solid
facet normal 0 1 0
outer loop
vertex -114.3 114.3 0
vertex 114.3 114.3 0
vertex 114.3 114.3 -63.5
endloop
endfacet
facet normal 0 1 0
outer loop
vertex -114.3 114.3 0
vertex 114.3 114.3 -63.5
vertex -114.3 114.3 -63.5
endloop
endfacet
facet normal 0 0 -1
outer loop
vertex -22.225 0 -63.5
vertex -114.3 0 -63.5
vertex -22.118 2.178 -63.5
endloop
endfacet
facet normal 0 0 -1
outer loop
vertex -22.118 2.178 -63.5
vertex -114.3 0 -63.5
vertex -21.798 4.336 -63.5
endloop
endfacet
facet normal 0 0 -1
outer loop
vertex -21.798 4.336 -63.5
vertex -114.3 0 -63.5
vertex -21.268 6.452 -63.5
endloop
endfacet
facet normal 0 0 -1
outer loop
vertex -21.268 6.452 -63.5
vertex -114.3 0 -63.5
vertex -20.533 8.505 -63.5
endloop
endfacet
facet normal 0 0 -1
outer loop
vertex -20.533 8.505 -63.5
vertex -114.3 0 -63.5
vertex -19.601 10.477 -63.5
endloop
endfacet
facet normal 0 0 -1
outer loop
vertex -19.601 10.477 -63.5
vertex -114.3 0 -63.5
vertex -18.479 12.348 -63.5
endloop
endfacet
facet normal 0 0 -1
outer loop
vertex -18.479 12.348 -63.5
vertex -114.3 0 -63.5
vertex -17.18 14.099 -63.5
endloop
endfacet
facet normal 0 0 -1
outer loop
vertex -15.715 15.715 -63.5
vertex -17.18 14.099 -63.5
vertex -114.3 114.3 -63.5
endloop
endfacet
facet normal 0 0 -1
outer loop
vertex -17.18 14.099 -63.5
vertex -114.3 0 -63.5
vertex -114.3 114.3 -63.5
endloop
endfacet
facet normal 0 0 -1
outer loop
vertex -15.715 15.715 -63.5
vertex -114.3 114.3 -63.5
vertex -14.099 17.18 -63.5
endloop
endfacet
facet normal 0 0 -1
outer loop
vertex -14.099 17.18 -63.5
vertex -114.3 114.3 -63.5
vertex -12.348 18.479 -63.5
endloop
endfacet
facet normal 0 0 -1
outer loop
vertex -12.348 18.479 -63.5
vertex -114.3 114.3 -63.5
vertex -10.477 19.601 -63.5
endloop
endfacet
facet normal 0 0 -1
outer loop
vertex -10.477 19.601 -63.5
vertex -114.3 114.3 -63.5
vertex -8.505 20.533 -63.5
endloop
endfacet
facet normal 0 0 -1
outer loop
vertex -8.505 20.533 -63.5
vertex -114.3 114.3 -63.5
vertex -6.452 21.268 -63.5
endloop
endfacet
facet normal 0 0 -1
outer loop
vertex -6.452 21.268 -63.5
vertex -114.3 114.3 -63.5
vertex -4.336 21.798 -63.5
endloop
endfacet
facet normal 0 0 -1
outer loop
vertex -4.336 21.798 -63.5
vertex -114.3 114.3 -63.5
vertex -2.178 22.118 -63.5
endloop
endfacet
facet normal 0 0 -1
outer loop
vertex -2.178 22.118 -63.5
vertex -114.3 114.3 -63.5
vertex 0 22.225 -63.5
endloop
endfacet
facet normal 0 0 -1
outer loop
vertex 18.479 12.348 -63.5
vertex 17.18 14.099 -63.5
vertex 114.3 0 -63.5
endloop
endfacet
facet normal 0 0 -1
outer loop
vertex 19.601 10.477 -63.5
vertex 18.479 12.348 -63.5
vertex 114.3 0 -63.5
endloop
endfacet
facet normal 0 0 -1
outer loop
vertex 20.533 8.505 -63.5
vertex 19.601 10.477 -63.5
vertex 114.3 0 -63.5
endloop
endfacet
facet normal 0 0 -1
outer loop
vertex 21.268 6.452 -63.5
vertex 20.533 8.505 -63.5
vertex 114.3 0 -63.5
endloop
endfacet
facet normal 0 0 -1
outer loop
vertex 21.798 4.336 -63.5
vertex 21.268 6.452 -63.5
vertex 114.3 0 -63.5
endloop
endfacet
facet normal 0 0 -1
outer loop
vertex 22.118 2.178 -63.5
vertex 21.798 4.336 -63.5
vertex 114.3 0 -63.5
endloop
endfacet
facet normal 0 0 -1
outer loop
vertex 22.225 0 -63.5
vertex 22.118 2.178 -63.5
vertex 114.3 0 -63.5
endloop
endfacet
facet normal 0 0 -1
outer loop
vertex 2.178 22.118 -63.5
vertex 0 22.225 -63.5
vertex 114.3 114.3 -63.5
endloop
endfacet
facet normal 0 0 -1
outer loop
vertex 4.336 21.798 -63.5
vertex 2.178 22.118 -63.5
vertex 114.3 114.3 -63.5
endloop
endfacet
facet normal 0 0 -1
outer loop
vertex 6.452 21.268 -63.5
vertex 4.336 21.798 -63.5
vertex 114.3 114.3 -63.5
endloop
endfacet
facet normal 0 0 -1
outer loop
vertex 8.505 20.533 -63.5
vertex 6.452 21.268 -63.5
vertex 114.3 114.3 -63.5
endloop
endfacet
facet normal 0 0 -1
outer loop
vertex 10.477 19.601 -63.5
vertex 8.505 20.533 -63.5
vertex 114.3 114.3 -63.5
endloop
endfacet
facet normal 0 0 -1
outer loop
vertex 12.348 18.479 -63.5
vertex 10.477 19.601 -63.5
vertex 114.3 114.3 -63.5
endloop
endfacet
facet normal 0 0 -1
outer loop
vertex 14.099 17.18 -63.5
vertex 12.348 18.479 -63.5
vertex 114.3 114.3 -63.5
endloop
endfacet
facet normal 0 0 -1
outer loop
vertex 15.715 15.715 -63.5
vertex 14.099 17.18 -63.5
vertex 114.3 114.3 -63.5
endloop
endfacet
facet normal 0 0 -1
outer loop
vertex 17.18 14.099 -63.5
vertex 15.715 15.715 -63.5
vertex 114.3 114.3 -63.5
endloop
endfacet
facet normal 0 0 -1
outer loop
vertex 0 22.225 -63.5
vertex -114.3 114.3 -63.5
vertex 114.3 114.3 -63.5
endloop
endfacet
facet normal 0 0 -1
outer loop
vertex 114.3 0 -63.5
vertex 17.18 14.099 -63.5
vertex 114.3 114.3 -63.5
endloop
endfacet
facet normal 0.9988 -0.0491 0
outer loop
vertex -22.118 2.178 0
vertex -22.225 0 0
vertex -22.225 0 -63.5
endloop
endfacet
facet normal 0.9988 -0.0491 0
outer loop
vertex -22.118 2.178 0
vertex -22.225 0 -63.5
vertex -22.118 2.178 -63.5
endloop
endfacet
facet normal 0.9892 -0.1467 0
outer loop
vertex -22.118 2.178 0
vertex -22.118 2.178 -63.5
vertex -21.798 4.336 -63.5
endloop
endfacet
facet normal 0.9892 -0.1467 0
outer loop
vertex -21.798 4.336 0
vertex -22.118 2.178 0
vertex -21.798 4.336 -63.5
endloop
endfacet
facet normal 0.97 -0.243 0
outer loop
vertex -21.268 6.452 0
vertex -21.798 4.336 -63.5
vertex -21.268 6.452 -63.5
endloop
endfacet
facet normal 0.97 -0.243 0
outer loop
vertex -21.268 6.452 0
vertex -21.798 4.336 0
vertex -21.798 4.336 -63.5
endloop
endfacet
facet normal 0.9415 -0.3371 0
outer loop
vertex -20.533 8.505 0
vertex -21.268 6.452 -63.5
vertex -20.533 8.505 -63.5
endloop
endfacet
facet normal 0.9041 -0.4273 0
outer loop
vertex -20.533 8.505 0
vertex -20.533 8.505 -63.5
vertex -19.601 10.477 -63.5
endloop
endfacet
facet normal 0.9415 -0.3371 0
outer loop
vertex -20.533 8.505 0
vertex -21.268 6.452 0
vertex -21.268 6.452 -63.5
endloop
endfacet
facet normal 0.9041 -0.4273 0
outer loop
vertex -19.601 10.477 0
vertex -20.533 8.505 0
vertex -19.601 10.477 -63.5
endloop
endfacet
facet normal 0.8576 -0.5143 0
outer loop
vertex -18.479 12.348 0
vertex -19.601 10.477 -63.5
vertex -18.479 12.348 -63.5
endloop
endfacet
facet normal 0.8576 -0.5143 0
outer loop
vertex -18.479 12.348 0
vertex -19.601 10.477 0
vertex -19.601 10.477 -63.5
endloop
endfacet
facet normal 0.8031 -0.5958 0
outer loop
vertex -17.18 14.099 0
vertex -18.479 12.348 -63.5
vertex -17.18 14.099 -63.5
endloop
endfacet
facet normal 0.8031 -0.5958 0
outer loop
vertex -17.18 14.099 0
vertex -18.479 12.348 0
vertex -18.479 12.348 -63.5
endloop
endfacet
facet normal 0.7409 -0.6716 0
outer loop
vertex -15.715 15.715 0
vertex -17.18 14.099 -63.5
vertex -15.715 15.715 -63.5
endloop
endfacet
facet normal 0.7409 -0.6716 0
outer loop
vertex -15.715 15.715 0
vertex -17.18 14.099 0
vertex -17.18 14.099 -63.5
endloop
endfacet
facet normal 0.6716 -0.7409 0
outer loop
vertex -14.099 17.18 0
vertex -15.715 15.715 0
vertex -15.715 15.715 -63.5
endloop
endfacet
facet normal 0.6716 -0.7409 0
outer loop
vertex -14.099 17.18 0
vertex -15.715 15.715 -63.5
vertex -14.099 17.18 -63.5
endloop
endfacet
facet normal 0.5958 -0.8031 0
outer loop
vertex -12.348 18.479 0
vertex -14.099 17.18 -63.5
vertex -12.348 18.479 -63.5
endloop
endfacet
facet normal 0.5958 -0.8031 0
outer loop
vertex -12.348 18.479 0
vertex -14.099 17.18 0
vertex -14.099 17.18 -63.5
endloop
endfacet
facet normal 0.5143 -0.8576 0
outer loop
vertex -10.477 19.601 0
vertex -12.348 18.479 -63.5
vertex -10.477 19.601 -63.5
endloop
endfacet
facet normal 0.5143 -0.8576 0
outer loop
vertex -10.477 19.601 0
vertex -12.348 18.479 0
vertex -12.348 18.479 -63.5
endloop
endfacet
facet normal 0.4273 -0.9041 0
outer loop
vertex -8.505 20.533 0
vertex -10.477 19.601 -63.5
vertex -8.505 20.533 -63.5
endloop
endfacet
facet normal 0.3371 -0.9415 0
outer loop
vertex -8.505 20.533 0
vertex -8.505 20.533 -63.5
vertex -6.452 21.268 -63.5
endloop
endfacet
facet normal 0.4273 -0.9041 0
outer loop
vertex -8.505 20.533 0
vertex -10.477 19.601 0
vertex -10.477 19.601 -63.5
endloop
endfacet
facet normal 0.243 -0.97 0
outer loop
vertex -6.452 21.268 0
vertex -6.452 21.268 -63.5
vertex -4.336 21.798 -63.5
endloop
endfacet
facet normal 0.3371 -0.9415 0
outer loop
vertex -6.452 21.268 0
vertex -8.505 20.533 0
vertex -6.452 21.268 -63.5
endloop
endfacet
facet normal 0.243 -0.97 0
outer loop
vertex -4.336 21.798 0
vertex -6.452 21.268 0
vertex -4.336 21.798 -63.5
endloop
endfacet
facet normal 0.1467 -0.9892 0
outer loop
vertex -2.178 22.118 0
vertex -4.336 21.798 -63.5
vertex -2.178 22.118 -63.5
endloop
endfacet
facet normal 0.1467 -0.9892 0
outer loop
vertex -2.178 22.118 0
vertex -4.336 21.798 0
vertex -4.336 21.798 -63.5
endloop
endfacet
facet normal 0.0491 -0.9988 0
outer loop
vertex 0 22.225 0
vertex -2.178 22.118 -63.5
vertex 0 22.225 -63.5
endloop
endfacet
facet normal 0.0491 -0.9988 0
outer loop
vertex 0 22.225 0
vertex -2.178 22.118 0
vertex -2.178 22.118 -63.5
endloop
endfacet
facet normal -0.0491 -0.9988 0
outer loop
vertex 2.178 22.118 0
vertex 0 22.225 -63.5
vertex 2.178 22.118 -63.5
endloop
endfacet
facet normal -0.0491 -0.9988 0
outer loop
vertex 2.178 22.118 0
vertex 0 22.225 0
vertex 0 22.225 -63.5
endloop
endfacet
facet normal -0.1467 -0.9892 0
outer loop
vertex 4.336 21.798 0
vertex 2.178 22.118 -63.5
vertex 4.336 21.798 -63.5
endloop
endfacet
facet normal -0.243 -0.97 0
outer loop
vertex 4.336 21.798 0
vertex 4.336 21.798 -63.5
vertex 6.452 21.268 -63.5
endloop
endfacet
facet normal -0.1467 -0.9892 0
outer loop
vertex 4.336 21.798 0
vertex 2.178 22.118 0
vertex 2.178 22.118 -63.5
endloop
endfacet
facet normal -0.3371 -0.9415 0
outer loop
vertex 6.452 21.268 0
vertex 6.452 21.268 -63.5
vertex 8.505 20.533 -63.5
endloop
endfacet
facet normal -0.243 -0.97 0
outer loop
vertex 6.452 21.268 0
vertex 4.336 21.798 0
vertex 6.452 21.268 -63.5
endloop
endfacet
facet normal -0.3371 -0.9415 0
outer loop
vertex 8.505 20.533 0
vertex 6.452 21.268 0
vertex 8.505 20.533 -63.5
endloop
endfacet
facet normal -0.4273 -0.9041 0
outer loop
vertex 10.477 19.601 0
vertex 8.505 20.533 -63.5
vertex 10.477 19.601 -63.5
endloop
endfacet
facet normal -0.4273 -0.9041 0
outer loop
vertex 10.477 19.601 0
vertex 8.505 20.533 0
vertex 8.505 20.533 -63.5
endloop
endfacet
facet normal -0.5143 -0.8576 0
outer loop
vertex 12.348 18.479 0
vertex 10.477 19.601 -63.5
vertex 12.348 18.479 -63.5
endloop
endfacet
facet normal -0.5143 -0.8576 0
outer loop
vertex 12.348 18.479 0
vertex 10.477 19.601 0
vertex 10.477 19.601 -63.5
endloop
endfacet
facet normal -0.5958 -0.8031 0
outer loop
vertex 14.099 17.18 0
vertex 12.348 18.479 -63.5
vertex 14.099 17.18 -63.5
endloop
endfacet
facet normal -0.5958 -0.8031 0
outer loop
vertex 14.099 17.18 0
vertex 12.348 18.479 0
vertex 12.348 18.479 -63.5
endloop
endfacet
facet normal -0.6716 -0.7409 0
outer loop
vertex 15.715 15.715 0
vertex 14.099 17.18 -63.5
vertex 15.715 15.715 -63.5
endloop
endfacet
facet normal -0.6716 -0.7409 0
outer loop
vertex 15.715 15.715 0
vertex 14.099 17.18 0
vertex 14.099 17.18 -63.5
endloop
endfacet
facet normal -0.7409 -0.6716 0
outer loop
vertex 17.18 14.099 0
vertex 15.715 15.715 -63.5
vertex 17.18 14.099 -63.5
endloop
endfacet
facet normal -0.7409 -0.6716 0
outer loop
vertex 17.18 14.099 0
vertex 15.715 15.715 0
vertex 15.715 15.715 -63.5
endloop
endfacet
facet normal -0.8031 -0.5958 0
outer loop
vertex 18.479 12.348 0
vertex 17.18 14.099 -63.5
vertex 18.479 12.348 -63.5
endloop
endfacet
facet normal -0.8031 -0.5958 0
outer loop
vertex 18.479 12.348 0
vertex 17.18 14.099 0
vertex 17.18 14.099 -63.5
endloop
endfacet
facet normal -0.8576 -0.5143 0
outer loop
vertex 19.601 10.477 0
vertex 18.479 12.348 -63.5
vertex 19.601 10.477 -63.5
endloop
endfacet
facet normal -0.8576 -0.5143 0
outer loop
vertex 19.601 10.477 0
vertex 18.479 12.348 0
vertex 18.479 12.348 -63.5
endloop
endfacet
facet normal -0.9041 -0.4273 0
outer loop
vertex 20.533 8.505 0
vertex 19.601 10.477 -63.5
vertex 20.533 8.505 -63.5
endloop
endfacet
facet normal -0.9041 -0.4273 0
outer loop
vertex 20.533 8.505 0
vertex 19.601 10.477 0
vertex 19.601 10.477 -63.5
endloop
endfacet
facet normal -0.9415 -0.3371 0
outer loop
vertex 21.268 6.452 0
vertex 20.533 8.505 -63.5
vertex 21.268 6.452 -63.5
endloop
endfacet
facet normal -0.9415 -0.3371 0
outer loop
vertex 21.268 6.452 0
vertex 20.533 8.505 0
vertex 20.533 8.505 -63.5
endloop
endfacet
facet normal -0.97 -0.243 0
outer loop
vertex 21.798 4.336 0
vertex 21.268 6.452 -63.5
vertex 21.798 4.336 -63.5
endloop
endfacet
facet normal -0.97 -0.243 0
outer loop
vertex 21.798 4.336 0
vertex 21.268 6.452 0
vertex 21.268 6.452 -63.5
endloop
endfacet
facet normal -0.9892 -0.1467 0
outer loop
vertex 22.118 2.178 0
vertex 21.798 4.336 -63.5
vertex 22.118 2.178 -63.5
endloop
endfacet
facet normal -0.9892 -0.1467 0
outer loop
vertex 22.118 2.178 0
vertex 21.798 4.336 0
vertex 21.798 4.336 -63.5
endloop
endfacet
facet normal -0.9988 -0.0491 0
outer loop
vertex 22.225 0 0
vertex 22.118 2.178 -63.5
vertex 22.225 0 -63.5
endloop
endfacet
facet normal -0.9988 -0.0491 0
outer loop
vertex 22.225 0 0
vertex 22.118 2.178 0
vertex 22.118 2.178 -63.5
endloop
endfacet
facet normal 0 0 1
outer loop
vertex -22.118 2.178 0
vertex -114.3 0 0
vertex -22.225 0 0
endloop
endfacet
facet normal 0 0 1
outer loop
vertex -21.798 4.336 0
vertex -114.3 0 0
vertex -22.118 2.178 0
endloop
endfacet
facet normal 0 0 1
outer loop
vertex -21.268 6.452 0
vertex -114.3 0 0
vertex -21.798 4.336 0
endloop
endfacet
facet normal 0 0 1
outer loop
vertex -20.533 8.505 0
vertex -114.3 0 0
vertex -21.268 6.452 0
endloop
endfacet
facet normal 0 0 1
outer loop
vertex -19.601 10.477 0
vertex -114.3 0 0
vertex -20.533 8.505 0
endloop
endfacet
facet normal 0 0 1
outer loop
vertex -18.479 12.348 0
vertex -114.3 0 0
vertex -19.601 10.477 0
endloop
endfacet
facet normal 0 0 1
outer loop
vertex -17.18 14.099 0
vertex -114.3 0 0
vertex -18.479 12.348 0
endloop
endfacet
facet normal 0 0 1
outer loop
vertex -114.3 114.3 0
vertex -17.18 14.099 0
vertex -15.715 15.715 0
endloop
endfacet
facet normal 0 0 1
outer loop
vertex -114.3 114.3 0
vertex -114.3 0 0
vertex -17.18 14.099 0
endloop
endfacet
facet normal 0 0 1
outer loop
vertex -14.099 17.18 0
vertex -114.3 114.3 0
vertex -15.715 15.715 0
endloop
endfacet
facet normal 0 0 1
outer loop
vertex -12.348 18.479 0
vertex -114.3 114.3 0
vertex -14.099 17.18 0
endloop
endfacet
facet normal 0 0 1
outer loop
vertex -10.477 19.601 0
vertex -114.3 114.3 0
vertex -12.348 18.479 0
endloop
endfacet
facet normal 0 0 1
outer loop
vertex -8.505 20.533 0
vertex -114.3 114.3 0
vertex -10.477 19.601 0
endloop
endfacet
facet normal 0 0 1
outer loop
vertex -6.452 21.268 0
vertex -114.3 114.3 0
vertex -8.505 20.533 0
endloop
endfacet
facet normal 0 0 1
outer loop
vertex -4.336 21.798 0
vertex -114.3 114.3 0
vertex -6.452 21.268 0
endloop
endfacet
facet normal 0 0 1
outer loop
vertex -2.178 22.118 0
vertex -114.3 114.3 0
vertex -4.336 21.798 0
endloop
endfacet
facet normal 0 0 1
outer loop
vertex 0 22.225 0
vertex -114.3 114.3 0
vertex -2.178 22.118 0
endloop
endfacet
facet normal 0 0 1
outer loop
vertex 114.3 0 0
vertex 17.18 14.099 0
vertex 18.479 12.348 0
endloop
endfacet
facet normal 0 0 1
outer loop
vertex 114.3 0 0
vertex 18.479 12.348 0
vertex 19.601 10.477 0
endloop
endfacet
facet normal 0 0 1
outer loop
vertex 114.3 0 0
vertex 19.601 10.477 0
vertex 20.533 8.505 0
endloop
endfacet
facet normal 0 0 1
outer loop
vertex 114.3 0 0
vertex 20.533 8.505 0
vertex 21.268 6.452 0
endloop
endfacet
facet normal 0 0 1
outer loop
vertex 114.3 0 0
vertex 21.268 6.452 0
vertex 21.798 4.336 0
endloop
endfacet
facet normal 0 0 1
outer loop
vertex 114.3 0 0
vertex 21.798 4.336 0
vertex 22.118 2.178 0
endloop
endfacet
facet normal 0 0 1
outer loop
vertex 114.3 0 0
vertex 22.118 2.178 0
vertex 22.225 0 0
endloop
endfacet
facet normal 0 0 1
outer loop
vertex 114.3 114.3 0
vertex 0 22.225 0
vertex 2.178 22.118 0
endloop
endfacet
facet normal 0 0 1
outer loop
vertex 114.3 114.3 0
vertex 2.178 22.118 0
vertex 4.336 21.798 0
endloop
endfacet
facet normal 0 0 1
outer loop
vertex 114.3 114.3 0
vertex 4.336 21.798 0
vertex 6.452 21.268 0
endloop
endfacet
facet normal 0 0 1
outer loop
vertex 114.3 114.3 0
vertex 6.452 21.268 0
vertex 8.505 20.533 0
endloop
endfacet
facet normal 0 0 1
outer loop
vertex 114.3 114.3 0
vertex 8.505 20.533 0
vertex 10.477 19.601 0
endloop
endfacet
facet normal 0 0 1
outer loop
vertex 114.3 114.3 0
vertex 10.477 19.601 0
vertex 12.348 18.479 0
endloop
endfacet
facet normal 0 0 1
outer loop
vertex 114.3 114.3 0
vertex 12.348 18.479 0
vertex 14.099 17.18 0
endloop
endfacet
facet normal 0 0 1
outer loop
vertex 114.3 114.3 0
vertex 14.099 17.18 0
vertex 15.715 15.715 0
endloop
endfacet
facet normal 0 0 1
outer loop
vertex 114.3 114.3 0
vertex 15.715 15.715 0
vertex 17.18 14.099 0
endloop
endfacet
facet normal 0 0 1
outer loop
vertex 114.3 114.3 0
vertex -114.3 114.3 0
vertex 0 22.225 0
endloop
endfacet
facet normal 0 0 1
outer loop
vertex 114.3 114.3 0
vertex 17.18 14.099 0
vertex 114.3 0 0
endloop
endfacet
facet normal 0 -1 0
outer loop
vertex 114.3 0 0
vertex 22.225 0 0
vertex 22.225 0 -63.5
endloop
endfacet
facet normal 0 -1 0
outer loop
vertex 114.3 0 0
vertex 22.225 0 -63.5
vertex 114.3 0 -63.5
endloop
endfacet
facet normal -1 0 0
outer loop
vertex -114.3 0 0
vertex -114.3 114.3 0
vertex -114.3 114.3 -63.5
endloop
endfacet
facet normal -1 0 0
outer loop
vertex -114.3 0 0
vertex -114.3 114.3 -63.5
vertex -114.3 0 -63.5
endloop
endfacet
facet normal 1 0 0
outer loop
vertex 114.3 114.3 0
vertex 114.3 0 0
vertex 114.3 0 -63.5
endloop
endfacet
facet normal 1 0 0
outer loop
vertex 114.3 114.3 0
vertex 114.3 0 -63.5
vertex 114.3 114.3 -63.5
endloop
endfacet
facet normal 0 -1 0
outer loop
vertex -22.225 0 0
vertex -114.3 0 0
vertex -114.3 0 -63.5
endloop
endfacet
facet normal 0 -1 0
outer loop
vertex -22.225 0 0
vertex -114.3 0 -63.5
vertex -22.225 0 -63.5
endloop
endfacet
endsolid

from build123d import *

# Parameters (mm, degrees)
F1_DEPTH = 63.5


with BuildPart() as f1:
    # F0 (on Top) → F1 (new body)
    with BuildSketch(Plane.XY):
        with BuildLine():
            Line((114.3, 114.3), (-114.3, 114.3))
            Line((-114.3, 114.3), (-114.3, 0))
            Line((-114.3, 0), (-22.225, 0))
            ThreePointArc((-22.225, 0), (0, 22.225), (22.225, 0))
            Line((22.225, 0), (114.3, 0))
            Line((114.3, 0), (114.3, 114.3))
        make_face()
    extrude(amount=-F1_DEPTH)


solid = f1.part
